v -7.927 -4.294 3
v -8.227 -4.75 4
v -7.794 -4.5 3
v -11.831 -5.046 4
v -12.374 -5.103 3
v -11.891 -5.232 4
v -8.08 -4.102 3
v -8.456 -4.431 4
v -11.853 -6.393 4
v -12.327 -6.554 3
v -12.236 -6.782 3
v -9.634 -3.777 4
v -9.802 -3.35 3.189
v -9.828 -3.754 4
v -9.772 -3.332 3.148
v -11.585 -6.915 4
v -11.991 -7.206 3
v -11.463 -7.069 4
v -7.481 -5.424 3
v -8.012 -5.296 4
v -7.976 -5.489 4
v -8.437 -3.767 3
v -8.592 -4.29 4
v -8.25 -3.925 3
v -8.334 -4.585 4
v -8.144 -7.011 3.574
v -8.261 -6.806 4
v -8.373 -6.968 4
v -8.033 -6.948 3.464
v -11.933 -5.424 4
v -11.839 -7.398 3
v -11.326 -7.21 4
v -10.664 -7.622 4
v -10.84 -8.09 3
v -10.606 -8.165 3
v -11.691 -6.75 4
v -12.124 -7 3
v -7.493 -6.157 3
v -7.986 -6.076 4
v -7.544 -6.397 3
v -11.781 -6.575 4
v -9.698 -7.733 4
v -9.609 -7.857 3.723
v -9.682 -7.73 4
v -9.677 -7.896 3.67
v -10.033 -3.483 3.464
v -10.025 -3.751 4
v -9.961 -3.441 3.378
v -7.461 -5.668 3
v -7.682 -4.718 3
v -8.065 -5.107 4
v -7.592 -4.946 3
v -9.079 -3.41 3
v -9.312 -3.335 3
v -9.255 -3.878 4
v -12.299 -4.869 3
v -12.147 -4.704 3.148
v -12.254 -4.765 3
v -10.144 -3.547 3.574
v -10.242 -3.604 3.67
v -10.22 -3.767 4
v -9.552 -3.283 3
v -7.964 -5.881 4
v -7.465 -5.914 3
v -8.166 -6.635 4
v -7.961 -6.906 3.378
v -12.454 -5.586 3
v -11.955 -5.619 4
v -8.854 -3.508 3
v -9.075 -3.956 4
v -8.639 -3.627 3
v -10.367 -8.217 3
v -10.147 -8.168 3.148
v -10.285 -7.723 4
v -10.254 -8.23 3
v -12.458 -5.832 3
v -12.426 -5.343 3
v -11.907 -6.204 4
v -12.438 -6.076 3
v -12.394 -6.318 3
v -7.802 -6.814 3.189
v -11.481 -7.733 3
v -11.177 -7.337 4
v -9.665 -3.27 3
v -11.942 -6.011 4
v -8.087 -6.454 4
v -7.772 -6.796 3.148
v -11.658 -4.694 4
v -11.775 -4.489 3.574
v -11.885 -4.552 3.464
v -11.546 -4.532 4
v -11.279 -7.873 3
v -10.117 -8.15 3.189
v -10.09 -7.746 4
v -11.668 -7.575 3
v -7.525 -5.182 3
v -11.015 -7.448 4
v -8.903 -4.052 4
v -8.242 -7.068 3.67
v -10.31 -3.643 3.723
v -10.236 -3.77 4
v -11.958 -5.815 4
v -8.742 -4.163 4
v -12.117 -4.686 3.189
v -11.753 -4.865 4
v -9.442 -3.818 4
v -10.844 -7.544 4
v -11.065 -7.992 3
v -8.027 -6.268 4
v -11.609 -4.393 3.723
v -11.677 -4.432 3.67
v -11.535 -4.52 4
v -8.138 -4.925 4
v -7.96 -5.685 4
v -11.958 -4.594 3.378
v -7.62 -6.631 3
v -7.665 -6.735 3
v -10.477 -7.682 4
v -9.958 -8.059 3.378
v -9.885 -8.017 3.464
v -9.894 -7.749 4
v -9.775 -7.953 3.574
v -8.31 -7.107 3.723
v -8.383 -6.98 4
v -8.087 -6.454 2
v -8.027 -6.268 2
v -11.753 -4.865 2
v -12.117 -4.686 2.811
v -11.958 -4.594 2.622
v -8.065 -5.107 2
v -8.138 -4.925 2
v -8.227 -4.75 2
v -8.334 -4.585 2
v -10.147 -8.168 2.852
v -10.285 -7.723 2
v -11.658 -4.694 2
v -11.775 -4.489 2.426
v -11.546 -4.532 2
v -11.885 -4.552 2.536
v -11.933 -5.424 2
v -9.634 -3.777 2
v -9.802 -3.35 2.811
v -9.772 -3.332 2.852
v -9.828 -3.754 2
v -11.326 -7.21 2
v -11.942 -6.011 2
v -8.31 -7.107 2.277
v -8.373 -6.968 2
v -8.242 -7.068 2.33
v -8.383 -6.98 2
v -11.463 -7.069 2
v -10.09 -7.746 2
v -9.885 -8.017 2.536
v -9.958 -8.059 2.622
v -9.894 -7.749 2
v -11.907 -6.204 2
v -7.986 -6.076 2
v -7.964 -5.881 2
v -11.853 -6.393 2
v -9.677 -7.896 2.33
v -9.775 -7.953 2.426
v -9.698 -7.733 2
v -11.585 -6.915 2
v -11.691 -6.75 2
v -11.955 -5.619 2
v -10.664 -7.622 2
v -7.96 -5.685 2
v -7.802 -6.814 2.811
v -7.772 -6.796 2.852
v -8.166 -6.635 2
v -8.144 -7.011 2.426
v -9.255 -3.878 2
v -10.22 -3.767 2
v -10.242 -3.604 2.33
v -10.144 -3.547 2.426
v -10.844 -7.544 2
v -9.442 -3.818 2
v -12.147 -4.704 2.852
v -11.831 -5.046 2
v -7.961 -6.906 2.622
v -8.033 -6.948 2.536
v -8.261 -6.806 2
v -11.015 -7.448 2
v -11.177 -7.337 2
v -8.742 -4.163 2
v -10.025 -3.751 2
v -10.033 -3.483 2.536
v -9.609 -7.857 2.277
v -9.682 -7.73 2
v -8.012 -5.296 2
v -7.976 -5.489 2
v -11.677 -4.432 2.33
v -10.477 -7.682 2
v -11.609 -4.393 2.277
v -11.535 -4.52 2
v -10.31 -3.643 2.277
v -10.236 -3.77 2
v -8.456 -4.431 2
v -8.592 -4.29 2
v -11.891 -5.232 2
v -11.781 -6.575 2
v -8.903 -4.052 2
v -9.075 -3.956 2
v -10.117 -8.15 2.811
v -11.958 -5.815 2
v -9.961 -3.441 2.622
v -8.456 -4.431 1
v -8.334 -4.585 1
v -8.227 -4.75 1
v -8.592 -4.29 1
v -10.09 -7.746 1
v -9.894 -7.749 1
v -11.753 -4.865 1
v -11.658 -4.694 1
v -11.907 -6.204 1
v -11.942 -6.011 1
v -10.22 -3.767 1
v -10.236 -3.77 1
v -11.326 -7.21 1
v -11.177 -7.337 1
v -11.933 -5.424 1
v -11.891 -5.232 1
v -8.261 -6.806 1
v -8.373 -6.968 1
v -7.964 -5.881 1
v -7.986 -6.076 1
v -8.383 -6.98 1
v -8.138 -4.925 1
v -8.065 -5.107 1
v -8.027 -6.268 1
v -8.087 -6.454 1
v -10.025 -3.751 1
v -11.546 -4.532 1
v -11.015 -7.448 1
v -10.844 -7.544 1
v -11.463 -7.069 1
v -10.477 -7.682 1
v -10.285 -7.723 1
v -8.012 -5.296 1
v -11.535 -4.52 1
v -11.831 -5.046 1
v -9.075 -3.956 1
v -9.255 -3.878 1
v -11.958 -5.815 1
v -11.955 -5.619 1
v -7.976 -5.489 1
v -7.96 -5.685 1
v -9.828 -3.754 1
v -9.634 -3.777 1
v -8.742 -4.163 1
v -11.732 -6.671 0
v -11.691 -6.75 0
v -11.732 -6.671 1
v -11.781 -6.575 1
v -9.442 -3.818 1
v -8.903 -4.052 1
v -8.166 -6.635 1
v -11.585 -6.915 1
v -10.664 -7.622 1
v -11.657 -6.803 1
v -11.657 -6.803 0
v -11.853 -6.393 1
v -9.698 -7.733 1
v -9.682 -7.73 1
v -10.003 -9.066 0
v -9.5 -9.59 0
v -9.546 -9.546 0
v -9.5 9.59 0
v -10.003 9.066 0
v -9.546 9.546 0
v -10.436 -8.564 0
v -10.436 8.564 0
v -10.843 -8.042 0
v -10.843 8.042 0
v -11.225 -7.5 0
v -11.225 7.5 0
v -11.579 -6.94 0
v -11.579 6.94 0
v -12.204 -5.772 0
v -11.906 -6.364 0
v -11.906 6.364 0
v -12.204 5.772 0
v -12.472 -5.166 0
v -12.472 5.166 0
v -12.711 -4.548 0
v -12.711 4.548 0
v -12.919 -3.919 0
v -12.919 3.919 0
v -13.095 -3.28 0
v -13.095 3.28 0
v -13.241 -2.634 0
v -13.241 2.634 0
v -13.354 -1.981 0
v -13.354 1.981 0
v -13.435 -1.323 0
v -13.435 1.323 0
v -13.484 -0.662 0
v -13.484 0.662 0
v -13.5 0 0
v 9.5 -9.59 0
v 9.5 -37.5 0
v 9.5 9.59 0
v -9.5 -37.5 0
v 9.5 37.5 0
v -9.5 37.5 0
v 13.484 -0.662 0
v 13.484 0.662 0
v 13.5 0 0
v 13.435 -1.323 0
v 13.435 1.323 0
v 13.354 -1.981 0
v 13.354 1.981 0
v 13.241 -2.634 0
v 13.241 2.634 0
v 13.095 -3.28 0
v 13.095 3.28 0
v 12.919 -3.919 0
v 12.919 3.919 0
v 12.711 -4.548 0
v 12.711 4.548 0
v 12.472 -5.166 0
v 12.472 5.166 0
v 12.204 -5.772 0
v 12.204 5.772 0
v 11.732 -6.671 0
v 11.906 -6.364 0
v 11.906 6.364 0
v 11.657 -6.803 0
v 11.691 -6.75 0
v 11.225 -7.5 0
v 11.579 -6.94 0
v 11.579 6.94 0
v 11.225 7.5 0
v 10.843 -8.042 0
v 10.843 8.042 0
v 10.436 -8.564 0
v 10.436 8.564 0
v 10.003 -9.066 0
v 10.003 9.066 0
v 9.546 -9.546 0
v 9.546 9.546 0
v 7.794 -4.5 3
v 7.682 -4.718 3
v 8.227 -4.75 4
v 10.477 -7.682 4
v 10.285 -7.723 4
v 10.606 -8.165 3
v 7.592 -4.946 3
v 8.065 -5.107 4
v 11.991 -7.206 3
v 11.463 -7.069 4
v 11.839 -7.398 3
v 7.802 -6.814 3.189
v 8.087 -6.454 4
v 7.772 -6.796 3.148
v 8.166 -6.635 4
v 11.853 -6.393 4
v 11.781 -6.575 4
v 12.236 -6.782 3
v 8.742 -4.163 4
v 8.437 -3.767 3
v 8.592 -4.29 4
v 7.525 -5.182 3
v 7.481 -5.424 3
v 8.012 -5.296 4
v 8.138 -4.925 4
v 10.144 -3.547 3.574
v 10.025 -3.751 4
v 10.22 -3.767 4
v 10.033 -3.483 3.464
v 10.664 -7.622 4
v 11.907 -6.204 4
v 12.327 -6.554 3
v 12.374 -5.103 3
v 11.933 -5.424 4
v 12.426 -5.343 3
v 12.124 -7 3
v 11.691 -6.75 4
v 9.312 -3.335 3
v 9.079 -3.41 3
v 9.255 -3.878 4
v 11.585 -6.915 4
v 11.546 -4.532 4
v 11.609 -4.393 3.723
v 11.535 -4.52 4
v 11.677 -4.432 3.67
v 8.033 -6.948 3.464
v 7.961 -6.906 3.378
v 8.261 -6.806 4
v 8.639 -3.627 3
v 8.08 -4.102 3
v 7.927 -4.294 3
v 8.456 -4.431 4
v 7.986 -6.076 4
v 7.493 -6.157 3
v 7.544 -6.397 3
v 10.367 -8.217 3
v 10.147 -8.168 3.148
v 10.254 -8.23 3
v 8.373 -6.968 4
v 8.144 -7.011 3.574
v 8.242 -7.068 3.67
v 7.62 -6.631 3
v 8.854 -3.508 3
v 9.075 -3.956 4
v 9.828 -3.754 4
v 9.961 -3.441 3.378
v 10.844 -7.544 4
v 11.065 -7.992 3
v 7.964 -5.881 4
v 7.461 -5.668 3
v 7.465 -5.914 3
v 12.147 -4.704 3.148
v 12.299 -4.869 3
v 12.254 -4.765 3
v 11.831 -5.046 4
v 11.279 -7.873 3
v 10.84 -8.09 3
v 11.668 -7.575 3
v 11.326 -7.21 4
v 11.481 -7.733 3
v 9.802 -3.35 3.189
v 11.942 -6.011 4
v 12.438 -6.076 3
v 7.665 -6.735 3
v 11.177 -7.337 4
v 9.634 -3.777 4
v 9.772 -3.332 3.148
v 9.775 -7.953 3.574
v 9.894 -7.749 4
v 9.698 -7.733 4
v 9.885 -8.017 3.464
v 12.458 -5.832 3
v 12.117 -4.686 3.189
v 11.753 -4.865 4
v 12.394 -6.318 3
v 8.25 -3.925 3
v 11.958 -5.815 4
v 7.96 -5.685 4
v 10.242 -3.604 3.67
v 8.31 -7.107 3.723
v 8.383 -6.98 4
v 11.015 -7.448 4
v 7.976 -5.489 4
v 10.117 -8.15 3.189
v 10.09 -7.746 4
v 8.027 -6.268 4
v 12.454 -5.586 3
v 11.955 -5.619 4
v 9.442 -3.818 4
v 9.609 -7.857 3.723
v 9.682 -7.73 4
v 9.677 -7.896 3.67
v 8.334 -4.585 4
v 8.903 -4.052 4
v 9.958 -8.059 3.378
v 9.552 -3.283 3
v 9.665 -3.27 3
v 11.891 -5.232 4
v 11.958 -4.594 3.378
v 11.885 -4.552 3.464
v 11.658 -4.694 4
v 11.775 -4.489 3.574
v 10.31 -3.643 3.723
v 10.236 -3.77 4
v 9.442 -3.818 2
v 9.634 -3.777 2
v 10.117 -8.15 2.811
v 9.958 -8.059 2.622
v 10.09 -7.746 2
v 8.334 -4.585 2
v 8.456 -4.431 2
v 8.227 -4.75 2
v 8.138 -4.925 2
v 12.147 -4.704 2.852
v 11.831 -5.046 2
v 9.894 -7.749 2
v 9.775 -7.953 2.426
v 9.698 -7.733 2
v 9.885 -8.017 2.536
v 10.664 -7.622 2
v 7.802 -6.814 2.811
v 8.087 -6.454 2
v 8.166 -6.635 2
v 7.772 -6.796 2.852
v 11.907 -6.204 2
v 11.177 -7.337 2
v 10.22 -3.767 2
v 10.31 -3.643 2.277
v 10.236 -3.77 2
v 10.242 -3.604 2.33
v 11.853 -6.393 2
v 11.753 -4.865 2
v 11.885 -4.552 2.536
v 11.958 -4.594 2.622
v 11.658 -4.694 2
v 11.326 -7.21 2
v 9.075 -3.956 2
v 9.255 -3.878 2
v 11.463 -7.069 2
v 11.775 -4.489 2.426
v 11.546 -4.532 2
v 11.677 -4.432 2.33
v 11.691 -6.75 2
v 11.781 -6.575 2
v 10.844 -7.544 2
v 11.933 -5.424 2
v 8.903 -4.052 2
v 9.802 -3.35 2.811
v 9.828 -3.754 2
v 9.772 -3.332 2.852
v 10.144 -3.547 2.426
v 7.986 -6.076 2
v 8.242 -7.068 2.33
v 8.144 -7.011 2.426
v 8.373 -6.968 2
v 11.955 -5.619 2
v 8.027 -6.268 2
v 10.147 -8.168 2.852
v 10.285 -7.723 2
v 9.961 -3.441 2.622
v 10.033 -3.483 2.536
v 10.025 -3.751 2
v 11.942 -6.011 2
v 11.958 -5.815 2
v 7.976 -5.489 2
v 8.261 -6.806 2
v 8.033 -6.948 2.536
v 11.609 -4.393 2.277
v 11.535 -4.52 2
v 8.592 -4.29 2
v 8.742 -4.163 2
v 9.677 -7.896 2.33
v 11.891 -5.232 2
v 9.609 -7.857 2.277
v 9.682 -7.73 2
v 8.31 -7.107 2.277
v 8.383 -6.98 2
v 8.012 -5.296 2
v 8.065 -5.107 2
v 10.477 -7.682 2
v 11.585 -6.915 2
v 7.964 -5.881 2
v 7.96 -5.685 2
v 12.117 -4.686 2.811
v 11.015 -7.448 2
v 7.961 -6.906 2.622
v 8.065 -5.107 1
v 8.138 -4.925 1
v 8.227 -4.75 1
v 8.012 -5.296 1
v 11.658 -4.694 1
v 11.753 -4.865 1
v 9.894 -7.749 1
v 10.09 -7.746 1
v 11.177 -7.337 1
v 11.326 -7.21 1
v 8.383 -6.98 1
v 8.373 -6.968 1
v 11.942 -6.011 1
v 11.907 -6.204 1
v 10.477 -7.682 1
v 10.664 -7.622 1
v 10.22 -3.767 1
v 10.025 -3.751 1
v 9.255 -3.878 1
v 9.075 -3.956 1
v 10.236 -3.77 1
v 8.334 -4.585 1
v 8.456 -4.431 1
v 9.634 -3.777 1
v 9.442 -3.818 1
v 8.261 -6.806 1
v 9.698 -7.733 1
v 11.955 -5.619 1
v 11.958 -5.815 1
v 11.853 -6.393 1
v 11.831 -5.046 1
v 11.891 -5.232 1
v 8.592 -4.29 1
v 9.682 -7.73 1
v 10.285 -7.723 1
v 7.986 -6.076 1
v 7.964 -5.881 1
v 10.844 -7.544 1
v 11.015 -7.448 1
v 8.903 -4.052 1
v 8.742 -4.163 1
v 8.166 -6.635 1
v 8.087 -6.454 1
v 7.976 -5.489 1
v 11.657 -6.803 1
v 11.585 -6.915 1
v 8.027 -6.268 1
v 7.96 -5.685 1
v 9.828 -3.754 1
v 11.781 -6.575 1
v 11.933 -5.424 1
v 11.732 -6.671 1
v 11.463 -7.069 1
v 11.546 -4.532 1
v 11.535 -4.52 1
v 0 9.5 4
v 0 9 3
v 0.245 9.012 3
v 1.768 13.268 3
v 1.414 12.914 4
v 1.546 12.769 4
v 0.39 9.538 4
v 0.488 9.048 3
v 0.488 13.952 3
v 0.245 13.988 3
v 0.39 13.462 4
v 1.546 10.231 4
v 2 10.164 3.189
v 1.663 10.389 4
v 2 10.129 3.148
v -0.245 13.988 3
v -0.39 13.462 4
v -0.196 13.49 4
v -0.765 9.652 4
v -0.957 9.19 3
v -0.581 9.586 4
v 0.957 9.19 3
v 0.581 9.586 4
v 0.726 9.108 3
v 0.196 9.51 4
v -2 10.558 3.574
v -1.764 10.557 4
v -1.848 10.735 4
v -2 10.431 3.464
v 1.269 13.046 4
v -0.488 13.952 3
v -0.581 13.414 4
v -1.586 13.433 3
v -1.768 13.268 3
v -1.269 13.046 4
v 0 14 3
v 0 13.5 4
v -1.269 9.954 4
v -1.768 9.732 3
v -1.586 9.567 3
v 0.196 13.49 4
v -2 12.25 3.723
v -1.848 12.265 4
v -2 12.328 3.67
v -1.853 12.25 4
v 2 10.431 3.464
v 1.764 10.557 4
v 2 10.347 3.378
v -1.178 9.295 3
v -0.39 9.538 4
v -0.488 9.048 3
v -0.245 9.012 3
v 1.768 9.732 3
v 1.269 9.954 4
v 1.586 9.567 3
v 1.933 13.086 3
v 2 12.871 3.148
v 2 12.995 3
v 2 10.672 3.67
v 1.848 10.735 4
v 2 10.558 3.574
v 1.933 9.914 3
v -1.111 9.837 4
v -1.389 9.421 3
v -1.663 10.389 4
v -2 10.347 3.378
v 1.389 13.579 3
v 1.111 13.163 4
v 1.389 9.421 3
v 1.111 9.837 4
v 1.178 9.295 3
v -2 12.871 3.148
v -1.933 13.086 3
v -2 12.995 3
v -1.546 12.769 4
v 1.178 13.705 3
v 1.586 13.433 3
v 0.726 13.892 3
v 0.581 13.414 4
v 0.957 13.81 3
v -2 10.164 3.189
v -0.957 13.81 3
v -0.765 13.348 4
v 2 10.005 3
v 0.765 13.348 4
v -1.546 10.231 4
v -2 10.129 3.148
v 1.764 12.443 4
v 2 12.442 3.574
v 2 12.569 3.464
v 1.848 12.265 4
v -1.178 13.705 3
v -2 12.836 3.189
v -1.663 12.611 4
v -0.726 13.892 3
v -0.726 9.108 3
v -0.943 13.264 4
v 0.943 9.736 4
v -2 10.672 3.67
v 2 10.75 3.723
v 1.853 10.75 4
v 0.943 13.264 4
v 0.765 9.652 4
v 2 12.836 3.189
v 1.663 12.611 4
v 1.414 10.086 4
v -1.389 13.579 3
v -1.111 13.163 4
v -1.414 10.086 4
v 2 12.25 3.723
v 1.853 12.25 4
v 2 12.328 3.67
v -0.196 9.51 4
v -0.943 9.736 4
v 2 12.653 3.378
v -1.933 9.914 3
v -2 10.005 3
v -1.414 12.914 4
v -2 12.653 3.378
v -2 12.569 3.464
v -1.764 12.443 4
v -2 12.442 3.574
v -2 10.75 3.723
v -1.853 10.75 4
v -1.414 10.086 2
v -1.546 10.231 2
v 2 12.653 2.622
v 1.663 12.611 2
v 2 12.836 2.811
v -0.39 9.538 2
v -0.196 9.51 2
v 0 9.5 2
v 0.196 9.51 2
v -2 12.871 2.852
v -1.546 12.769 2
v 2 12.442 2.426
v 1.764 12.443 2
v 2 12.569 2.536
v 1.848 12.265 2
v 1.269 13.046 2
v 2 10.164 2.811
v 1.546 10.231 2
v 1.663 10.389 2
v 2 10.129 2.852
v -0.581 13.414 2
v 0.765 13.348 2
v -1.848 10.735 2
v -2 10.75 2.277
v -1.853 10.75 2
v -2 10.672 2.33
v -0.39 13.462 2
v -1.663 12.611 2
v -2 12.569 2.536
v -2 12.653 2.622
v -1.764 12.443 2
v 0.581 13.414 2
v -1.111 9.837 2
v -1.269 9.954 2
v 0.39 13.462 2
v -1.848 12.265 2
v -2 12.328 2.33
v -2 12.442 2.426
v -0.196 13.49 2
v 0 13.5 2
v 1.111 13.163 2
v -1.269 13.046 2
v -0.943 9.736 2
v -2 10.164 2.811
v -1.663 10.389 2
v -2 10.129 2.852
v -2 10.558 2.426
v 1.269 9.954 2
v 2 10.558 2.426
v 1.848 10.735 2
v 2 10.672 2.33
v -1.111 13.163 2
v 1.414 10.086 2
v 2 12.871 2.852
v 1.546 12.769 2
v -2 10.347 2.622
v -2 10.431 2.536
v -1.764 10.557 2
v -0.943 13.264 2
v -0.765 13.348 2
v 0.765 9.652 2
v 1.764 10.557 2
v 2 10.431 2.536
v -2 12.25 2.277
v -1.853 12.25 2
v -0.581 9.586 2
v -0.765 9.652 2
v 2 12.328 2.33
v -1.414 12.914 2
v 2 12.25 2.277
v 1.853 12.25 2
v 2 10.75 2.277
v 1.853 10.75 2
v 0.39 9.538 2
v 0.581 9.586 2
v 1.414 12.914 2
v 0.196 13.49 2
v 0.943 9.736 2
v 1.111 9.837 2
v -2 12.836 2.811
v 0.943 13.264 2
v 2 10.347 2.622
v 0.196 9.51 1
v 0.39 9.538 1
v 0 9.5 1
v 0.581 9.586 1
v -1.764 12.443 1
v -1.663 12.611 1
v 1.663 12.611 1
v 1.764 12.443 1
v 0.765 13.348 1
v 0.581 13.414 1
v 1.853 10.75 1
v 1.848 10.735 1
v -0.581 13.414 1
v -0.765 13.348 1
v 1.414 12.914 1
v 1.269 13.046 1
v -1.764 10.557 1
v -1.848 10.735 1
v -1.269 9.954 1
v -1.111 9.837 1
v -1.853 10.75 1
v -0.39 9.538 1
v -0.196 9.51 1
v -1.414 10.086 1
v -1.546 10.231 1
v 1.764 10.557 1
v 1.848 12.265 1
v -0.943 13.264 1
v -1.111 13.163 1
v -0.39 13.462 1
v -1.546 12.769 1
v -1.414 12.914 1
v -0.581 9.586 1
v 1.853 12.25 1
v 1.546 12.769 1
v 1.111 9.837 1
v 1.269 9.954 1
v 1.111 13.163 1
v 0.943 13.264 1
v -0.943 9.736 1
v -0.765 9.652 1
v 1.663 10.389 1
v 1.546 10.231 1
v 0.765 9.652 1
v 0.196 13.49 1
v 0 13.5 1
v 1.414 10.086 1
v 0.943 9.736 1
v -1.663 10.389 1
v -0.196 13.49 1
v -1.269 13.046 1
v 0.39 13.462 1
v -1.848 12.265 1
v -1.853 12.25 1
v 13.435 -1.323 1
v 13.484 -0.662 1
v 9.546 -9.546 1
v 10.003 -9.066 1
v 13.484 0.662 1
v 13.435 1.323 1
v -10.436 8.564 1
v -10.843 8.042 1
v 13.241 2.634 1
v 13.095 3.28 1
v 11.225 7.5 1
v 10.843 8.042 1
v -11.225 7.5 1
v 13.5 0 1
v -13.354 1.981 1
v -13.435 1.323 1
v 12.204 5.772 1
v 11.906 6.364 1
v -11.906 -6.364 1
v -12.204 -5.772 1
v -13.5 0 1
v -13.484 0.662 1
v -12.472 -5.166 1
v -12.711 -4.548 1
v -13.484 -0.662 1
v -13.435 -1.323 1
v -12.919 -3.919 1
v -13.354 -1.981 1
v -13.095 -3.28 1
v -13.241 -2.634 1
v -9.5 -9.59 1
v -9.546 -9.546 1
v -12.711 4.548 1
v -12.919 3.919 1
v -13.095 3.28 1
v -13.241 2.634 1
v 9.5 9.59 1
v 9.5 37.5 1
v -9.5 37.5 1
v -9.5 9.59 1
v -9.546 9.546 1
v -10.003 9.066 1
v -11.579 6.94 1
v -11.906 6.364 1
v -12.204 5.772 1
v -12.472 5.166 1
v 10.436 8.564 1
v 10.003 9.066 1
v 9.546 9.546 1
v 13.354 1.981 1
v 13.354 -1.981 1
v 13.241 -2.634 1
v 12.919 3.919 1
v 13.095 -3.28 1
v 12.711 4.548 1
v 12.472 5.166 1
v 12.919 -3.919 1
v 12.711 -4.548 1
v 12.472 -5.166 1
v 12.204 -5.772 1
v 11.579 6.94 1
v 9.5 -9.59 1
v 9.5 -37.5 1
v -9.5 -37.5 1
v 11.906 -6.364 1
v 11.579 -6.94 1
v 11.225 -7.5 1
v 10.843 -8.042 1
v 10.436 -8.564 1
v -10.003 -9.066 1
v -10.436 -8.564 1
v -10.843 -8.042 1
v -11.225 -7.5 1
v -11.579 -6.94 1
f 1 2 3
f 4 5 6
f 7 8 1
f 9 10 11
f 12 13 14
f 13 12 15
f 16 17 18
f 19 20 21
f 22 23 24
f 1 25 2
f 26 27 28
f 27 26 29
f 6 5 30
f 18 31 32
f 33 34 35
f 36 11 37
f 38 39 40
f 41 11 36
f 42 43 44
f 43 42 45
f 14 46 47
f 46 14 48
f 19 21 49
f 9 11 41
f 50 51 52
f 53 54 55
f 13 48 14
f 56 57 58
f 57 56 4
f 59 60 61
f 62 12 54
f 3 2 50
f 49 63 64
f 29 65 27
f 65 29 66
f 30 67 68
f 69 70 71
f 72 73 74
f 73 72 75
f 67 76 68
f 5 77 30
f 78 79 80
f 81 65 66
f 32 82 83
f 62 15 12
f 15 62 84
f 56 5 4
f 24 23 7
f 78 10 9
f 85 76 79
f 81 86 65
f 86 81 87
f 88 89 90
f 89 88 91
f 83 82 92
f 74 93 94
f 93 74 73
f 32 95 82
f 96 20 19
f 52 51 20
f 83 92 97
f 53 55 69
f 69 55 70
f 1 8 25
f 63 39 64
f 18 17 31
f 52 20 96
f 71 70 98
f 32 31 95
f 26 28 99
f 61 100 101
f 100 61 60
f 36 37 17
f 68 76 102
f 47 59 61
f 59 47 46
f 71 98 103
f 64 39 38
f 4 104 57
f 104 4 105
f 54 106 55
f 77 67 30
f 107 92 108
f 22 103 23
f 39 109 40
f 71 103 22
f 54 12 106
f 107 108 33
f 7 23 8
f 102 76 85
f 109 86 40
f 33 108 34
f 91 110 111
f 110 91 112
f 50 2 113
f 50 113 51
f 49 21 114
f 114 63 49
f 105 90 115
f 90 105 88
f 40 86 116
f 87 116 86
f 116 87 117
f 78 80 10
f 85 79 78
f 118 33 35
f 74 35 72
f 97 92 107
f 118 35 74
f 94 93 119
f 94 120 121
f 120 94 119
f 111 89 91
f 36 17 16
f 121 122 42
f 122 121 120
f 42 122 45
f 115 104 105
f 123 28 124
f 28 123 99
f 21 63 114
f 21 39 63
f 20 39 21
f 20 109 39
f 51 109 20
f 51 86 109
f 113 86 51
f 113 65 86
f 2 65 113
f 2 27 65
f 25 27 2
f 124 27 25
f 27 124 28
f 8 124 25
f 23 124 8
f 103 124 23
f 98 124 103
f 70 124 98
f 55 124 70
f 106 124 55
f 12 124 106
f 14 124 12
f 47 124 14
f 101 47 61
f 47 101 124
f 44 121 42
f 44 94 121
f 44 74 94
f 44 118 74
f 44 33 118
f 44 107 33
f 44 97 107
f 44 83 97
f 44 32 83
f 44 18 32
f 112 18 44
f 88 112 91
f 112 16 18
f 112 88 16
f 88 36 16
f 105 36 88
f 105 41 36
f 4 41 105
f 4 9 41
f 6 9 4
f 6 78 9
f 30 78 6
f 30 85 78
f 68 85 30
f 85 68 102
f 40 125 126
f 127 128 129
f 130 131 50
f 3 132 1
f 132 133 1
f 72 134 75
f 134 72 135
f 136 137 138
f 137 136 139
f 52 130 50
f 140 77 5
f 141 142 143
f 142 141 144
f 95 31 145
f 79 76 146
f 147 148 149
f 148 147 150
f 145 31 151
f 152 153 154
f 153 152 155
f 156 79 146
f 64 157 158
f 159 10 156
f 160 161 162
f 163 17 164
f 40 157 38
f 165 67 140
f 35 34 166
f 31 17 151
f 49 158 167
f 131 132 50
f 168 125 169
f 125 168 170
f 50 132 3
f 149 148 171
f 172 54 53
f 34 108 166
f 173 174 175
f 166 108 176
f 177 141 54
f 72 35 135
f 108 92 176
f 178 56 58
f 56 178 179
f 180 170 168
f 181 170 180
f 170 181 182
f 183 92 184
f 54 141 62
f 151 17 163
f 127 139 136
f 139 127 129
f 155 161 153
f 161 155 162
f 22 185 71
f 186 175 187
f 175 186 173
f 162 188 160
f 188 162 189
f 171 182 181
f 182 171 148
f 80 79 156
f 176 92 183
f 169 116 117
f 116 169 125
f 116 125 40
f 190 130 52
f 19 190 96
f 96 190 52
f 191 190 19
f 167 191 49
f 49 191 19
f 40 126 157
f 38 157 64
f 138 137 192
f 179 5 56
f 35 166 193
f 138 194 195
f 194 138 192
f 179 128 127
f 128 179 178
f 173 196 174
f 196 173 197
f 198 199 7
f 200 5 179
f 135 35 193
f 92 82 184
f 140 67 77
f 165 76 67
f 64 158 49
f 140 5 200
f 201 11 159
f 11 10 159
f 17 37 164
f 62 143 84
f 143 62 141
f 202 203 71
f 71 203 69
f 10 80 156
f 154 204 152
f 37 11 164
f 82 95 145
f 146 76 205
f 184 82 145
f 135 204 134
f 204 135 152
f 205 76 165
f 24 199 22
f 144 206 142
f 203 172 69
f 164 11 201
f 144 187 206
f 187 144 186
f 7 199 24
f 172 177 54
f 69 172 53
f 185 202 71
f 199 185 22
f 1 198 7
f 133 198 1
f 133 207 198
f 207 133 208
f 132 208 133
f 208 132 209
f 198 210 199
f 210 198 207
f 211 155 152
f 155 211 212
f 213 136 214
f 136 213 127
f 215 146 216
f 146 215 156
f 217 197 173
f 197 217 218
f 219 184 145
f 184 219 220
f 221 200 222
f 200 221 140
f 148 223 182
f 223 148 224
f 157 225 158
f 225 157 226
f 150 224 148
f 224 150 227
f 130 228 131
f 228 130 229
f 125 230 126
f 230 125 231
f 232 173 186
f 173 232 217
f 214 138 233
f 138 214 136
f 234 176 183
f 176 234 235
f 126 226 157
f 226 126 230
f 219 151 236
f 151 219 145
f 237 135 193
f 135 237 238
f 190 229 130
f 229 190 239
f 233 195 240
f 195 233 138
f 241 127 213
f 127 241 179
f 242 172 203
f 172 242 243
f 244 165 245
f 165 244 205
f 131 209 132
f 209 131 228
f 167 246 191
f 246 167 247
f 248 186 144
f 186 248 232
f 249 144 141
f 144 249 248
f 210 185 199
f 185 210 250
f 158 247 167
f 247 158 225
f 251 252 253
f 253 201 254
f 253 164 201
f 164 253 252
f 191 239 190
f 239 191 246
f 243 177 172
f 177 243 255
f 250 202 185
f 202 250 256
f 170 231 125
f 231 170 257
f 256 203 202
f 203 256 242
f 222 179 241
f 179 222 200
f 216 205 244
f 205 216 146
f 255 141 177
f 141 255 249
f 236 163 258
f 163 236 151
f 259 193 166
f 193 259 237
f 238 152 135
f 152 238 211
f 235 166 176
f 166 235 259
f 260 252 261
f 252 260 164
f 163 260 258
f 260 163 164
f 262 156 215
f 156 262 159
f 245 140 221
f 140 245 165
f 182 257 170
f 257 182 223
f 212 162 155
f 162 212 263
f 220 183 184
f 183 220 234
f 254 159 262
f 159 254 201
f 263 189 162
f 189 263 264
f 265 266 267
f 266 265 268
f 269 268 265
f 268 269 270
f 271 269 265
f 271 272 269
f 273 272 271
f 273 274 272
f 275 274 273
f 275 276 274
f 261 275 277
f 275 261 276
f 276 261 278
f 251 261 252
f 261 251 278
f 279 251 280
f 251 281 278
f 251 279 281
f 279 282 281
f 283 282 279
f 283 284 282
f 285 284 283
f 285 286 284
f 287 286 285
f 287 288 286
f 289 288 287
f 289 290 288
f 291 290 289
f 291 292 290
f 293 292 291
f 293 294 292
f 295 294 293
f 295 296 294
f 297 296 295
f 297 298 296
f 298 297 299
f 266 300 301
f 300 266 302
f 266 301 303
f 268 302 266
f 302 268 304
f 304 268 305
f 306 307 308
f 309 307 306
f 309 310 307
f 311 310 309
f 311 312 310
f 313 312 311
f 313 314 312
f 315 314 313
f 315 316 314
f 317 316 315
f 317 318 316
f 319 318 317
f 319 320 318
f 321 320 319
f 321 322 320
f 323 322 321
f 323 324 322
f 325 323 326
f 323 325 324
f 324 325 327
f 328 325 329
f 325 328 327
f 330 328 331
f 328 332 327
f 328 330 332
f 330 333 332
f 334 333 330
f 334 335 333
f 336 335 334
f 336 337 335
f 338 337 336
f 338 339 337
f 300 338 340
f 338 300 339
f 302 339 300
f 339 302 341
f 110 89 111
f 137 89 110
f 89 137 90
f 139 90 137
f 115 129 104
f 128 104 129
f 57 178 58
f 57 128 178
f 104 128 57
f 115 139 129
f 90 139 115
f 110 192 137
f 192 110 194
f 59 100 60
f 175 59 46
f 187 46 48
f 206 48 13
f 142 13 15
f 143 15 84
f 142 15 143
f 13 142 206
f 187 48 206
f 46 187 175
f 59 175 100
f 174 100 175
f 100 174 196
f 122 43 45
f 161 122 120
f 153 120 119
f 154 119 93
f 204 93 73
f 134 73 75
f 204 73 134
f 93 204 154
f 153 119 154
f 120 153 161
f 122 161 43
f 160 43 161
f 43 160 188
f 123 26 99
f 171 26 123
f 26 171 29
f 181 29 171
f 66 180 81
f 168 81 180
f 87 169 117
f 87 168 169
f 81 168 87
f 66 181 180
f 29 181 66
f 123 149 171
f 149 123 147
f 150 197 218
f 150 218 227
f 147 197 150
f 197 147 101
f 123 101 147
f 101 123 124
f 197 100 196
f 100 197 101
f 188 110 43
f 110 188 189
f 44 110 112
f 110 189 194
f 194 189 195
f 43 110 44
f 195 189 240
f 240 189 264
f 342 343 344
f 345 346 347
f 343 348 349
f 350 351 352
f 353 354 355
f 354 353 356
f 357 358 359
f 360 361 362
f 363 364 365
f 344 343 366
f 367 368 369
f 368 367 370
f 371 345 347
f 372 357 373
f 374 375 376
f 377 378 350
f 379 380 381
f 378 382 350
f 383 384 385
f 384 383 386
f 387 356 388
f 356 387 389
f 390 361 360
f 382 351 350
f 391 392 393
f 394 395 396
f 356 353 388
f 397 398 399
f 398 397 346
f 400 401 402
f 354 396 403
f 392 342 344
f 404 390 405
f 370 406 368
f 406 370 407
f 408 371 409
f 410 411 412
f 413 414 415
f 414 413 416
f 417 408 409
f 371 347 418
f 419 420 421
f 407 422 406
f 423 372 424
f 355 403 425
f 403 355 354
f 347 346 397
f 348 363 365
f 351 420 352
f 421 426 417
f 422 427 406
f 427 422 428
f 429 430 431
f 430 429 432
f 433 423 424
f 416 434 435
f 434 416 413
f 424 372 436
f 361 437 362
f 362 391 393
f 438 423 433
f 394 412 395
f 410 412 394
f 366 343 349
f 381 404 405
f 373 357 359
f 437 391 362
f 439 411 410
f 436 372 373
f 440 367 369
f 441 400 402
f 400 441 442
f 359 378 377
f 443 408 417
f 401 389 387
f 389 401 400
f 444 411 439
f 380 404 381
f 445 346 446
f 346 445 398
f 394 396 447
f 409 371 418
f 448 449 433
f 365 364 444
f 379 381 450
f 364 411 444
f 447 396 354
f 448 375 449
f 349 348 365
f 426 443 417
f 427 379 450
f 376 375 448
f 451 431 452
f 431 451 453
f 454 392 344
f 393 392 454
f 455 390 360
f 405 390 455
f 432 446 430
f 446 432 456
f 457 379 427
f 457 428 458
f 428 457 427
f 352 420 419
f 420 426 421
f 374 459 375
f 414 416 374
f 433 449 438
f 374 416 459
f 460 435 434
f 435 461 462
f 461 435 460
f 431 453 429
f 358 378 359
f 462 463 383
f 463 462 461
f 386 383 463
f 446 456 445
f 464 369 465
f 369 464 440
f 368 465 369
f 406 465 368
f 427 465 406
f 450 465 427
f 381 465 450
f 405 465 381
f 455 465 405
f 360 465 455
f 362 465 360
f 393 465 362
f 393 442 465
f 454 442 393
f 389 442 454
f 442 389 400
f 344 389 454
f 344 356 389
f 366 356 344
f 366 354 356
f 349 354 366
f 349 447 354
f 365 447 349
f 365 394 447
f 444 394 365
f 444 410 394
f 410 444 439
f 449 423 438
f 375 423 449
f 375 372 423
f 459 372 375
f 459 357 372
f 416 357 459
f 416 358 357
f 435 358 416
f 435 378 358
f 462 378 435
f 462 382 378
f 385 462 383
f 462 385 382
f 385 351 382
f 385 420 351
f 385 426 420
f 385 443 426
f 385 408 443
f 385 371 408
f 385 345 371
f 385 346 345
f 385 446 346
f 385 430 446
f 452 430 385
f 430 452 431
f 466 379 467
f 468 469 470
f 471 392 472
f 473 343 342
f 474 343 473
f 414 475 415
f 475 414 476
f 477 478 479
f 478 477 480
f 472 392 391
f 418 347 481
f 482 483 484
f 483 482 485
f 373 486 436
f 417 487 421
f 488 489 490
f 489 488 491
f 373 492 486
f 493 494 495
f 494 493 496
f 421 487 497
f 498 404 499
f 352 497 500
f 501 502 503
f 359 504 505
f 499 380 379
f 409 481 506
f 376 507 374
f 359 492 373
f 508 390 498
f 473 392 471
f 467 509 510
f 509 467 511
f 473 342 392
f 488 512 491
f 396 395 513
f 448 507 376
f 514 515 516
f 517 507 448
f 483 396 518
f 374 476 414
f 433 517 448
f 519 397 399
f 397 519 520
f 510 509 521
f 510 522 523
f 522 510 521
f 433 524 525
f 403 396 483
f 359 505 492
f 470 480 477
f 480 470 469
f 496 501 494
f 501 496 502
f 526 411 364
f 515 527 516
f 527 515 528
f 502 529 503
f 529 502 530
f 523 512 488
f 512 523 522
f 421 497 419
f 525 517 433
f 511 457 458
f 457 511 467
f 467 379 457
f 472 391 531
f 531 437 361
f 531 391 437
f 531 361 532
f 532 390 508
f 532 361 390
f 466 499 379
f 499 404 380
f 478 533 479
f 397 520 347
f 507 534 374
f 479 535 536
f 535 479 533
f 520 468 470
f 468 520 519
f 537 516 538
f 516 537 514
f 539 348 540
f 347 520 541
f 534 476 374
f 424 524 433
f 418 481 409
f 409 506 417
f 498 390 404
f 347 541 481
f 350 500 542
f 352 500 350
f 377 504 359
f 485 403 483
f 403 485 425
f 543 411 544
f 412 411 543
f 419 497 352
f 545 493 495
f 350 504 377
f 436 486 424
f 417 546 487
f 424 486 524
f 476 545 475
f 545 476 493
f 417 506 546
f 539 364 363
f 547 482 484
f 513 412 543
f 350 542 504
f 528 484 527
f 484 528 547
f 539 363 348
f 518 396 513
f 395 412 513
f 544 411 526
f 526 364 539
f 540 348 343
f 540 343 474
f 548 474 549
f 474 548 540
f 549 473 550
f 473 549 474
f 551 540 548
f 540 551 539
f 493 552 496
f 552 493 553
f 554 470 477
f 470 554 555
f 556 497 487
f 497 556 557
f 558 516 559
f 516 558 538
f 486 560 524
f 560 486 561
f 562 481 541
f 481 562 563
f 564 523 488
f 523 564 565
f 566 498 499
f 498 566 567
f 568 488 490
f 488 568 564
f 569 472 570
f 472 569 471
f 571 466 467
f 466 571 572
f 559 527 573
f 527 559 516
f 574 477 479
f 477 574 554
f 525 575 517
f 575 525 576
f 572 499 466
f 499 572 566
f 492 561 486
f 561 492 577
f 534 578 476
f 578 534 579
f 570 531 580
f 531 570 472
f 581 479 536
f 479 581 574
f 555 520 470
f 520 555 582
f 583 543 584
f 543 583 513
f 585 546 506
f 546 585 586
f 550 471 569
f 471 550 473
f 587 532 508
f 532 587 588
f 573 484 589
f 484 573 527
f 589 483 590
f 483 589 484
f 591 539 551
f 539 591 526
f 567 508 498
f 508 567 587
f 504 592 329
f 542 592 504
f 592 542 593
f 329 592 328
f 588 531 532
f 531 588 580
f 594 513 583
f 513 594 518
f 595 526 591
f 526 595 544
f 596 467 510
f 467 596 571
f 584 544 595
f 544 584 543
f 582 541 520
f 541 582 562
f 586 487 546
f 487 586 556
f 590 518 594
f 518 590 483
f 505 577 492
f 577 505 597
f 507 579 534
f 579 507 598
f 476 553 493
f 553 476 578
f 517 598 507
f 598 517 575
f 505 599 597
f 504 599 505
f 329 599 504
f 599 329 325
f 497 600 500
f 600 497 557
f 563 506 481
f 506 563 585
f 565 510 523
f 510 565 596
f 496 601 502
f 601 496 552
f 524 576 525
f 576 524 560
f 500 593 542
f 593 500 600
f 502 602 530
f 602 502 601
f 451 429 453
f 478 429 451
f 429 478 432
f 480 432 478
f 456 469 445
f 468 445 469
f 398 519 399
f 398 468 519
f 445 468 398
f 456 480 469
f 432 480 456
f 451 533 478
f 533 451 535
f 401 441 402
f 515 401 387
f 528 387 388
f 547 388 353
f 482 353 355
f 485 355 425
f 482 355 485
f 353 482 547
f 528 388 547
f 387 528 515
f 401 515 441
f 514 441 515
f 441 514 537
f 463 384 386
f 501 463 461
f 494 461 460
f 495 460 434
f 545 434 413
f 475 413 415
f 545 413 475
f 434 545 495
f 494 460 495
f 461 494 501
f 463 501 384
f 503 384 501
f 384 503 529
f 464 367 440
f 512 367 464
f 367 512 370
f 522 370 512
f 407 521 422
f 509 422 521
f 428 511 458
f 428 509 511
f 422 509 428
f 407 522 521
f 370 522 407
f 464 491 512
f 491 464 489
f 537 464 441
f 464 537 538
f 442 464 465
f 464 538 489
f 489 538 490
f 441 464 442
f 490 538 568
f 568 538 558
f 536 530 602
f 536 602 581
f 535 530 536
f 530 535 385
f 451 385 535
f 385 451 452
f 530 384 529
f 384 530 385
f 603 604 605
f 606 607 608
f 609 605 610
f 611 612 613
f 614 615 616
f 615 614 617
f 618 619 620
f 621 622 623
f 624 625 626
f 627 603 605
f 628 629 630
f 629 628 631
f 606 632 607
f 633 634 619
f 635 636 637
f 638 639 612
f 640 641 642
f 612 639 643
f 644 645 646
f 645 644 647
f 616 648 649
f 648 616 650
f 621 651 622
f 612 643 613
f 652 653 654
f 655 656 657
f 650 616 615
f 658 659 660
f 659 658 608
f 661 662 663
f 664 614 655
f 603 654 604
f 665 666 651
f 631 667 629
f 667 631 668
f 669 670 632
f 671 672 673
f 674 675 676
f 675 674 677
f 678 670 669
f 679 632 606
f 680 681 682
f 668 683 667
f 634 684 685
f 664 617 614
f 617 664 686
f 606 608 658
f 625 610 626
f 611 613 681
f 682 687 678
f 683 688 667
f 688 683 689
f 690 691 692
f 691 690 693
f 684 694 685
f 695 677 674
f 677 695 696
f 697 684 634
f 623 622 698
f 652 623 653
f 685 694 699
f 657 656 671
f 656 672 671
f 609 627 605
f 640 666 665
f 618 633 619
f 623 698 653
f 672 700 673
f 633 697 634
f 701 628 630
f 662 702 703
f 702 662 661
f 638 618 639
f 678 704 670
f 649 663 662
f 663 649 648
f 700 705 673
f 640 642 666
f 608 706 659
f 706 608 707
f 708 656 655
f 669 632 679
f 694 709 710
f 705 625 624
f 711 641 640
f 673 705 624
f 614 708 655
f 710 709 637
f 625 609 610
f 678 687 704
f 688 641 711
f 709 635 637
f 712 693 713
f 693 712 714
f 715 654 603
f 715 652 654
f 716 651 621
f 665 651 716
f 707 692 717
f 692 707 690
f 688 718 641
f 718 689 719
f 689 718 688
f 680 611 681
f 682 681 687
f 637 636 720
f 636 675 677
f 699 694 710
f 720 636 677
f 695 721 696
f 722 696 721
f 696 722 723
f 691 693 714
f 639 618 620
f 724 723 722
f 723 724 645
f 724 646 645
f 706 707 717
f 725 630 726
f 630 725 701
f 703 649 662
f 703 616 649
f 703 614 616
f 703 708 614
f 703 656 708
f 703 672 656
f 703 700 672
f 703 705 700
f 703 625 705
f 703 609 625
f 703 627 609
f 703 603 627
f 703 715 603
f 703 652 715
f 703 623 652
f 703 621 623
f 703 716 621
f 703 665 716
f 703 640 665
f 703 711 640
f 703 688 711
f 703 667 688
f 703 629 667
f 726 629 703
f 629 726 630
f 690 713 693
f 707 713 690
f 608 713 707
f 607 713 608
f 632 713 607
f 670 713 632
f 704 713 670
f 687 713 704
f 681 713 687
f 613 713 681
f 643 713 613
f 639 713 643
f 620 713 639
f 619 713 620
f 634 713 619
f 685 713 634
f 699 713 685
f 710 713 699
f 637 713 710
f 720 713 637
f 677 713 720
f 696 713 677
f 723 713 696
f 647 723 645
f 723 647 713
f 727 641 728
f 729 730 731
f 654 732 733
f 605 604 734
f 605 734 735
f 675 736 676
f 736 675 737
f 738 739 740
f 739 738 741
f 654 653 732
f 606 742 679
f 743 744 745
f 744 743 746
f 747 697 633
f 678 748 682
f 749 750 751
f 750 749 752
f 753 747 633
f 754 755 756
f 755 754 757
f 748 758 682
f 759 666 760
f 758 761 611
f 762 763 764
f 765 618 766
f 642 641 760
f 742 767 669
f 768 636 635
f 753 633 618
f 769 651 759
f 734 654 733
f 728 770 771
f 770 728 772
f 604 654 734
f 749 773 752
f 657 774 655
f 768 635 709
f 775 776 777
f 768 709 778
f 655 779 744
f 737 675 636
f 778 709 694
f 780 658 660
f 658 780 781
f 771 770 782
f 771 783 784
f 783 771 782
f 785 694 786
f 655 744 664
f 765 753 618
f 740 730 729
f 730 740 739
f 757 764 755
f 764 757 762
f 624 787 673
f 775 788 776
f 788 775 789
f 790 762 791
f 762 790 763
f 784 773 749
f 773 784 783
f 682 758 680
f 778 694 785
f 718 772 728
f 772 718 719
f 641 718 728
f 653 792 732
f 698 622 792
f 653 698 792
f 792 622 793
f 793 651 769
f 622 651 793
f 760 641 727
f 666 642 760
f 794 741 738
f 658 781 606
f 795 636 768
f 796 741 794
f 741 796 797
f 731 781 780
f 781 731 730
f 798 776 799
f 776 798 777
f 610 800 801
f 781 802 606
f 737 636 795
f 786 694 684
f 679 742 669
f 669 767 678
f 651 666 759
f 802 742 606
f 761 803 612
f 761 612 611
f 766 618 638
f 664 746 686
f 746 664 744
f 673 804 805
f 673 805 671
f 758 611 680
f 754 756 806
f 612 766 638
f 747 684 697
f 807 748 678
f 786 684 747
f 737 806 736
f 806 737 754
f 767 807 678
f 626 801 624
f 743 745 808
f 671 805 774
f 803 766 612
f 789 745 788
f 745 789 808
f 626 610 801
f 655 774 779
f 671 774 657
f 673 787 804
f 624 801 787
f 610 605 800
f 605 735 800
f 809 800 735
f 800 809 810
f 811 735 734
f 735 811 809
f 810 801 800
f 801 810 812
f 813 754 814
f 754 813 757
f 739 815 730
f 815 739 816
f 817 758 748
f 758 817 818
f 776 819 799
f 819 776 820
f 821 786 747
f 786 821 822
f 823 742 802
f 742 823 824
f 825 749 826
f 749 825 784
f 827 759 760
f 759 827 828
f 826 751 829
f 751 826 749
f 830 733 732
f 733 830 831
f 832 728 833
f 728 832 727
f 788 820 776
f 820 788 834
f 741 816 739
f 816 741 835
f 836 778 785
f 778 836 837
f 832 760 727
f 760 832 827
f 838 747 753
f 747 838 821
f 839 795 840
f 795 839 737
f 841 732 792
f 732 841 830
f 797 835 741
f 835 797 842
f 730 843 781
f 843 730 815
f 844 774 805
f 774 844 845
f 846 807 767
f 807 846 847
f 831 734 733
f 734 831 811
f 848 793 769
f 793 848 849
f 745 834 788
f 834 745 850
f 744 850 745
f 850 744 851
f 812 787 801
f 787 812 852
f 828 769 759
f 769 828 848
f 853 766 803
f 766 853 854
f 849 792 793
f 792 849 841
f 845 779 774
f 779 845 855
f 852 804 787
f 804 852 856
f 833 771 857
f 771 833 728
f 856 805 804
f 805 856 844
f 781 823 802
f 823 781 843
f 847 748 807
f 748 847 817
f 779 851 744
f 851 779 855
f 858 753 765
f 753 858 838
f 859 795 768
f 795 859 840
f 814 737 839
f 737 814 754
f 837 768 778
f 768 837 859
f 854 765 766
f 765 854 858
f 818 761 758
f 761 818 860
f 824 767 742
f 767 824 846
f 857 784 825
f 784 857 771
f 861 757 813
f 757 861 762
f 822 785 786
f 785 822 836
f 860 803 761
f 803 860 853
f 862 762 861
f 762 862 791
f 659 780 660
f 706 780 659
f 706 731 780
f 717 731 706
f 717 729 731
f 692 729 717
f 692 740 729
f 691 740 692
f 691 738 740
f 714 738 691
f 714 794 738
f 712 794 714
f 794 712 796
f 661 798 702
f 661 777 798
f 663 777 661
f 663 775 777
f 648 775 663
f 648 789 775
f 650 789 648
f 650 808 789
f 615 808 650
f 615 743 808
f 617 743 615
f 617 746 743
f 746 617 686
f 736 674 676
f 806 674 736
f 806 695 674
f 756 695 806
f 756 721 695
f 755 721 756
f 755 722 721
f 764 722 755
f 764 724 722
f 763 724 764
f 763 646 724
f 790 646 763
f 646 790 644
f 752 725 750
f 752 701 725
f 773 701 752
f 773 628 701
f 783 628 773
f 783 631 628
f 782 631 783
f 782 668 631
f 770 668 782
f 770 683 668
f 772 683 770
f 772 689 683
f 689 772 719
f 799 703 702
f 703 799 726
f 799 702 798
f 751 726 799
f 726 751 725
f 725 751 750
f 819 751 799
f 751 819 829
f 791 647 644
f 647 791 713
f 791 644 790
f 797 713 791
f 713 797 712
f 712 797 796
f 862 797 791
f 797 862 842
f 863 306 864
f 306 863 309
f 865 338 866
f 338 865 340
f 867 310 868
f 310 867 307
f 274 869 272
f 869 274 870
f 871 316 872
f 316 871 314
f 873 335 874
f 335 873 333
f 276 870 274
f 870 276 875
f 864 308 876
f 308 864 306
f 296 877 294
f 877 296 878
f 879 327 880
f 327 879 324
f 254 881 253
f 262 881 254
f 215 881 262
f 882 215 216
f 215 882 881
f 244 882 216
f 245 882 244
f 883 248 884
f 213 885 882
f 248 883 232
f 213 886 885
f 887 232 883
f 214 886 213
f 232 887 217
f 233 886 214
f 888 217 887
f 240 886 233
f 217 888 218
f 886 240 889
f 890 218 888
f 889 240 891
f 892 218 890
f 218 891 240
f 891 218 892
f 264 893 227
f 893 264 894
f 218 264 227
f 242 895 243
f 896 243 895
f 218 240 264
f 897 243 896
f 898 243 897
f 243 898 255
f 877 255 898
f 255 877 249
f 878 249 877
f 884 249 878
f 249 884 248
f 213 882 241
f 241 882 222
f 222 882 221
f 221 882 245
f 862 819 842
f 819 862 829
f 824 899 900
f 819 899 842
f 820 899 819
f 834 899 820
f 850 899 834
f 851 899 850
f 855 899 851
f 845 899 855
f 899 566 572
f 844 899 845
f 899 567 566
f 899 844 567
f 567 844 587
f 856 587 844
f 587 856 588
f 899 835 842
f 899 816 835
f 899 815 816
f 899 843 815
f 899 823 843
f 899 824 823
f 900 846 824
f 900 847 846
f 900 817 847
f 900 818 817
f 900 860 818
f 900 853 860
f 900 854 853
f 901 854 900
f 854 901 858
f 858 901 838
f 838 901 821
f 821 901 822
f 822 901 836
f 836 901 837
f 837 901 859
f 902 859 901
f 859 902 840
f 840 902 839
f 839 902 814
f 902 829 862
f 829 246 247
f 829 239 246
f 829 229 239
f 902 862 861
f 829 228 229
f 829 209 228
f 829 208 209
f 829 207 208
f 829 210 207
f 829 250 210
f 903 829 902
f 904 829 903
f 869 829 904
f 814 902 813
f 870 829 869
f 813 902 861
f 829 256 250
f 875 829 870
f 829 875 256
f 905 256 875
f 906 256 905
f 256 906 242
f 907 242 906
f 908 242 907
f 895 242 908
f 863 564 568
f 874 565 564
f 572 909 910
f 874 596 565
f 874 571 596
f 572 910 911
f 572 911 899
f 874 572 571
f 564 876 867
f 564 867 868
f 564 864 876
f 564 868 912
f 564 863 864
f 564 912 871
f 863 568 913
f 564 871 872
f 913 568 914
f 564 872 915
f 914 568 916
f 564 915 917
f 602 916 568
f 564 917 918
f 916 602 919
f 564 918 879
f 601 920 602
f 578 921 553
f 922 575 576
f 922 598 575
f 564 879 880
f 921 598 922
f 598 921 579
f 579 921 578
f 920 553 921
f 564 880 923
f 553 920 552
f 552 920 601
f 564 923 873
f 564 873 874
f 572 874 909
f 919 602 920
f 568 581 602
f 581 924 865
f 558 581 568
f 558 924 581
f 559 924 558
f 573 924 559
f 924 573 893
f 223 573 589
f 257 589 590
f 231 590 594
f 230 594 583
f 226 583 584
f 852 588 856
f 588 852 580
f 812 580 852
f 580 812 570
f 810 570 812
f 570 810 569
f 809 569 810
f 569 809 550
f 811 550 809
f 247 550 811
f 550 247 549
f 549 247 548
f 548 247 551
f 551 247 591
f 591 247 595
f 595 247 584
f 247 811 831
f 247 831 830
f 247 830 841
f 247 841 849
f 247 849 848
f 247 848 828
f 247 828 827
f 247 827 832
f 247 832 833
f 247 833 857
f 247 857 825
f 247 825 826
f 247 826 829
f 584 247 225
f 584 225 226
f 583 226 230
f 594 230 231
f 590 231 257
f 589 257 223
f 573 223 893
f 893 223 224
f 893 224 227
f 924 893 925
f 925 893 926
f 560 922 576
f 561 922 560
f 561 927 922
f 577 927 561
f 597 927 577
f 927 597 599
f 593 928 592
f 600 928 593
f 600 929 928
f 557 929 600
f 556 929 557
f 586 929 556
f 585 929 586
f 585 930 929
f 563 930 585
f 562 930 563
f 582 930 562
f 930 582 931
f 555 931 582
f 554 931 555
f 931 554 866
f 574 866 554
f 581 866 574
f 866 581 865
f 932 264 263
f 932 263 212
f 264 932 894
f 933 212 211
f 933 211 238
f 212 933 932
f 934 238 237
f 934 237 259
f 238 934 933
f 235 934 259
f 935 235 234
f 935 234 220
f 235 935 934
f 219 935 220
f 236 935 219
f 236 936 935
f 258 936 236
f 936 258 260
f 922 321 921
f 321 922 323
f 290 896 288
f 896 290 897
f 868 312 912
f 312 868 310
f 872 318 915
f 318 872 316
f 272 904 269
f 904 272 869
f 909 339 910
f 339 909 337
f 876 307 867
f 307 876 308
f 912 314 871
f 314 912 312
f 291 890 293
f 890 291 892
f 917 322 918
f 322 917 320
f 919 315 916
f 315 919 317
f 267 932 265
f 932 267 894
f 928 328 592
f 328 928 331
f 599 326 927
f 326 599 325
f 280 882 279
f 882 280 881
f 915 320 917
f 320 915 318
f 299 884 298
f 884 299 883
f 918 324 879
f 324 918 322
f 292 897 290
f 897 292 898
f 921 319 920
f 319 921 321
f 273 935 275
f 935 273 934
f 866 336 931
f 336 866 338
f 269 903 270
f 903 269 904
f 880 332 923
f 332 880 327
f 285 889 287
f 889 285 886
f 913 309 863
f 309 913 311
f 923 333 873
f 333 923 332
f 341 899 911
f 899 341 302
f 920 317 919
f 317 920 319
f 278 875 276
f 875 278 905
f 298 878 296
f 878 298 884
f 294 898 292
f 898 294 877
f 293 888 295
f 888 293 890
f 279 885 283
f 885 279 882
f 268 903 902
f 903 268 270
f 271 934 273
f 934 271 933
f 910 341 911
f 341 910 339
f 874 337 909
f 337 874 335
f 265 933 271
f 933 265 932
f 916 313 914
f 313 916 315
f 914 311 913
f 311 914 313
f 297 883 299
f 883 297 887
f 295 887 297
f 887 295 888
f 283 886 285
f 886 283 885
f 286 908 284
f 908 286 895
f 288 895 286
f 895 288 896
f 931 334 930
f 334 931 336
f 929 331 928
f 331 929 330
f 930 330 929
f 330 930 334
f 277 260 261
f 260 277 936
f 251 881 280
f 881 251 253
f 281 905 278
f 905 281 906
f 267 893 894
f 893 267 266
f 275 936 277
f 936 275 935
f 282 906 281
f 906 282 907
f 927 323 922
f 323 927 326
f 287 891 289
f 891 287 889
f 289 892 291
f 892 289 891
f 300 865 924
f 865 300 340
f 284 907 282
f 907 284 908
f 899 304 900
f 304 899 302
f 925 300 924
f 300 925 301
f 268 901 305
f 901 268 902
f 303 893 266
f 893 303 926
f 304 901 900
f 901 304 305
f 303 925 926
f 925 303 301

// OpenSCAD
DIAM_LOWER=4;
DIAM_UPPER=6;
WIDTH=2;
OFFSET_FROM_CENTER=11.5;
TRAY_DEPTH=3;
COMMAND_STRIP_Y=75;
COMMAND_STRIP_X=19;

module peg() {
    difference() {
        translate([0, 0, 2]) intersection() {
            union() {
                translate([0, 0, 1]) cylinder(r2=DIAM_LOWER/2, r1=(DIAM_LOWER+1)/2, h=1, $fn=64);
                cylinder(r1=DIAM_LOWER/2, r2=(DIAM_LOWER+1)/2, h=1, $fn=64);
                translate([0, 0, -1 * TRAY_DEPTH]) cylinder(r=DIAM_LOWER/2, h=TRAY_DEPTH, $fn=64);
            }
            cube([DIAM_LOWER+1, DIAM_LOWER, 2*WIDTH], center=true);
        }
        cube([1.5, 200, 200], center=true);
    }
}

union() {
    difference() {
        union() {
            for(f=[0:2]) {
                rotate([0, 0, 30 + (120 * f)]) translate([-1 * OFFSET_FROM_CENTER, 0, 0]) peg();
            }
            cylinder(r=OFFSET_FROM_CENTER + (DIAM_LOWER/2), h=1, $fn=128);
        }
        // this turns out to be pointless bc of command strip geom
        cylinder(r=OFFSET_FROM_CENTER - (DIAM_LOWER/2), h=1, $fn=128);
    }
    translate([0, 0, 0.5]) cube([COMMAND_STRIP_X, COMMAND_STRIP_Y,1], center=true);
}
